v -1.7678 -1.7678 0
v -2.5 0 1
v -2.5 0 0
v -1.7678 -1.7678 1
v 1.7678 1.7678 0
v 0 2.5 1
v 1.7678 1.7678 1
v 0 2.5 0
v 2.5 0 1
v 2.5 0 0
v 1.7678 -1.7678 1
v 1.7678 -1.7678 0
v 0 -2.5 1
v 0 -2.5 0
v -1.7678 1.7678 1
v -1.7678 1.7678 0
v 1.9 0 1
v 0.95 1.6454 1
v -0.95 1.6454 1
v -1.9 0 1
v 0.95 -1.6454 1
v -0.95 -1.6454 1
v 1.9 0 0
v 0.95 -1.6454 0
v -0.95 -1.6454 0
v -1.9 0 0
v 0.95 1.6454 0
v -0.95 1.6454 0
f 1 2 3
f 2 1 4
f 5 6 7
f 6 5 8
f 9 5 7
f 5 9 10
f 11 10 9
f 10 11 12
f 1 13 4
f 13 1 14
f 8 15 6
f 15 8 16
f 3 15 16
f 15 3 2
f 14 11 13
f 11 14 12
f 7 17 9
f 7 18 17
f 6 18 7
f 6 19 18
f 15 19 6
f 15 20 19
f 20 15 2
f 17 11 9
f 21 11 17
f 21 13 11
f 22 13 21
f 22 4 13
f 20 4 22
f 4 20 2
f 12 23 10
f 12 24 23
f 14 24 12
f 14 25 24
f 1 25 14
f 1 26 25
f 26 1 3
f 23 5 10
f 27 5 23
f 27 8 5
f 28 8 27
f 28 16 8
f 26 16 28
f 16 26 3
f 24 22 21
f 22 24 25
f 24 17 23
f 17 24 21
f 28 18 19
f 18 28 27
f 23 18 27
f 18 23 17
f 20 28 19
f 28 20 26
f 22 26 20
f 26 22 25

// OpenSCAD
//outer diameter 6
r1 = 2.5;
//inner 2
r2 = 1.9;

h = 1;
difference(){
cylinder(r=r1, h=h);
cylinder(r=r2, h=h);
}
